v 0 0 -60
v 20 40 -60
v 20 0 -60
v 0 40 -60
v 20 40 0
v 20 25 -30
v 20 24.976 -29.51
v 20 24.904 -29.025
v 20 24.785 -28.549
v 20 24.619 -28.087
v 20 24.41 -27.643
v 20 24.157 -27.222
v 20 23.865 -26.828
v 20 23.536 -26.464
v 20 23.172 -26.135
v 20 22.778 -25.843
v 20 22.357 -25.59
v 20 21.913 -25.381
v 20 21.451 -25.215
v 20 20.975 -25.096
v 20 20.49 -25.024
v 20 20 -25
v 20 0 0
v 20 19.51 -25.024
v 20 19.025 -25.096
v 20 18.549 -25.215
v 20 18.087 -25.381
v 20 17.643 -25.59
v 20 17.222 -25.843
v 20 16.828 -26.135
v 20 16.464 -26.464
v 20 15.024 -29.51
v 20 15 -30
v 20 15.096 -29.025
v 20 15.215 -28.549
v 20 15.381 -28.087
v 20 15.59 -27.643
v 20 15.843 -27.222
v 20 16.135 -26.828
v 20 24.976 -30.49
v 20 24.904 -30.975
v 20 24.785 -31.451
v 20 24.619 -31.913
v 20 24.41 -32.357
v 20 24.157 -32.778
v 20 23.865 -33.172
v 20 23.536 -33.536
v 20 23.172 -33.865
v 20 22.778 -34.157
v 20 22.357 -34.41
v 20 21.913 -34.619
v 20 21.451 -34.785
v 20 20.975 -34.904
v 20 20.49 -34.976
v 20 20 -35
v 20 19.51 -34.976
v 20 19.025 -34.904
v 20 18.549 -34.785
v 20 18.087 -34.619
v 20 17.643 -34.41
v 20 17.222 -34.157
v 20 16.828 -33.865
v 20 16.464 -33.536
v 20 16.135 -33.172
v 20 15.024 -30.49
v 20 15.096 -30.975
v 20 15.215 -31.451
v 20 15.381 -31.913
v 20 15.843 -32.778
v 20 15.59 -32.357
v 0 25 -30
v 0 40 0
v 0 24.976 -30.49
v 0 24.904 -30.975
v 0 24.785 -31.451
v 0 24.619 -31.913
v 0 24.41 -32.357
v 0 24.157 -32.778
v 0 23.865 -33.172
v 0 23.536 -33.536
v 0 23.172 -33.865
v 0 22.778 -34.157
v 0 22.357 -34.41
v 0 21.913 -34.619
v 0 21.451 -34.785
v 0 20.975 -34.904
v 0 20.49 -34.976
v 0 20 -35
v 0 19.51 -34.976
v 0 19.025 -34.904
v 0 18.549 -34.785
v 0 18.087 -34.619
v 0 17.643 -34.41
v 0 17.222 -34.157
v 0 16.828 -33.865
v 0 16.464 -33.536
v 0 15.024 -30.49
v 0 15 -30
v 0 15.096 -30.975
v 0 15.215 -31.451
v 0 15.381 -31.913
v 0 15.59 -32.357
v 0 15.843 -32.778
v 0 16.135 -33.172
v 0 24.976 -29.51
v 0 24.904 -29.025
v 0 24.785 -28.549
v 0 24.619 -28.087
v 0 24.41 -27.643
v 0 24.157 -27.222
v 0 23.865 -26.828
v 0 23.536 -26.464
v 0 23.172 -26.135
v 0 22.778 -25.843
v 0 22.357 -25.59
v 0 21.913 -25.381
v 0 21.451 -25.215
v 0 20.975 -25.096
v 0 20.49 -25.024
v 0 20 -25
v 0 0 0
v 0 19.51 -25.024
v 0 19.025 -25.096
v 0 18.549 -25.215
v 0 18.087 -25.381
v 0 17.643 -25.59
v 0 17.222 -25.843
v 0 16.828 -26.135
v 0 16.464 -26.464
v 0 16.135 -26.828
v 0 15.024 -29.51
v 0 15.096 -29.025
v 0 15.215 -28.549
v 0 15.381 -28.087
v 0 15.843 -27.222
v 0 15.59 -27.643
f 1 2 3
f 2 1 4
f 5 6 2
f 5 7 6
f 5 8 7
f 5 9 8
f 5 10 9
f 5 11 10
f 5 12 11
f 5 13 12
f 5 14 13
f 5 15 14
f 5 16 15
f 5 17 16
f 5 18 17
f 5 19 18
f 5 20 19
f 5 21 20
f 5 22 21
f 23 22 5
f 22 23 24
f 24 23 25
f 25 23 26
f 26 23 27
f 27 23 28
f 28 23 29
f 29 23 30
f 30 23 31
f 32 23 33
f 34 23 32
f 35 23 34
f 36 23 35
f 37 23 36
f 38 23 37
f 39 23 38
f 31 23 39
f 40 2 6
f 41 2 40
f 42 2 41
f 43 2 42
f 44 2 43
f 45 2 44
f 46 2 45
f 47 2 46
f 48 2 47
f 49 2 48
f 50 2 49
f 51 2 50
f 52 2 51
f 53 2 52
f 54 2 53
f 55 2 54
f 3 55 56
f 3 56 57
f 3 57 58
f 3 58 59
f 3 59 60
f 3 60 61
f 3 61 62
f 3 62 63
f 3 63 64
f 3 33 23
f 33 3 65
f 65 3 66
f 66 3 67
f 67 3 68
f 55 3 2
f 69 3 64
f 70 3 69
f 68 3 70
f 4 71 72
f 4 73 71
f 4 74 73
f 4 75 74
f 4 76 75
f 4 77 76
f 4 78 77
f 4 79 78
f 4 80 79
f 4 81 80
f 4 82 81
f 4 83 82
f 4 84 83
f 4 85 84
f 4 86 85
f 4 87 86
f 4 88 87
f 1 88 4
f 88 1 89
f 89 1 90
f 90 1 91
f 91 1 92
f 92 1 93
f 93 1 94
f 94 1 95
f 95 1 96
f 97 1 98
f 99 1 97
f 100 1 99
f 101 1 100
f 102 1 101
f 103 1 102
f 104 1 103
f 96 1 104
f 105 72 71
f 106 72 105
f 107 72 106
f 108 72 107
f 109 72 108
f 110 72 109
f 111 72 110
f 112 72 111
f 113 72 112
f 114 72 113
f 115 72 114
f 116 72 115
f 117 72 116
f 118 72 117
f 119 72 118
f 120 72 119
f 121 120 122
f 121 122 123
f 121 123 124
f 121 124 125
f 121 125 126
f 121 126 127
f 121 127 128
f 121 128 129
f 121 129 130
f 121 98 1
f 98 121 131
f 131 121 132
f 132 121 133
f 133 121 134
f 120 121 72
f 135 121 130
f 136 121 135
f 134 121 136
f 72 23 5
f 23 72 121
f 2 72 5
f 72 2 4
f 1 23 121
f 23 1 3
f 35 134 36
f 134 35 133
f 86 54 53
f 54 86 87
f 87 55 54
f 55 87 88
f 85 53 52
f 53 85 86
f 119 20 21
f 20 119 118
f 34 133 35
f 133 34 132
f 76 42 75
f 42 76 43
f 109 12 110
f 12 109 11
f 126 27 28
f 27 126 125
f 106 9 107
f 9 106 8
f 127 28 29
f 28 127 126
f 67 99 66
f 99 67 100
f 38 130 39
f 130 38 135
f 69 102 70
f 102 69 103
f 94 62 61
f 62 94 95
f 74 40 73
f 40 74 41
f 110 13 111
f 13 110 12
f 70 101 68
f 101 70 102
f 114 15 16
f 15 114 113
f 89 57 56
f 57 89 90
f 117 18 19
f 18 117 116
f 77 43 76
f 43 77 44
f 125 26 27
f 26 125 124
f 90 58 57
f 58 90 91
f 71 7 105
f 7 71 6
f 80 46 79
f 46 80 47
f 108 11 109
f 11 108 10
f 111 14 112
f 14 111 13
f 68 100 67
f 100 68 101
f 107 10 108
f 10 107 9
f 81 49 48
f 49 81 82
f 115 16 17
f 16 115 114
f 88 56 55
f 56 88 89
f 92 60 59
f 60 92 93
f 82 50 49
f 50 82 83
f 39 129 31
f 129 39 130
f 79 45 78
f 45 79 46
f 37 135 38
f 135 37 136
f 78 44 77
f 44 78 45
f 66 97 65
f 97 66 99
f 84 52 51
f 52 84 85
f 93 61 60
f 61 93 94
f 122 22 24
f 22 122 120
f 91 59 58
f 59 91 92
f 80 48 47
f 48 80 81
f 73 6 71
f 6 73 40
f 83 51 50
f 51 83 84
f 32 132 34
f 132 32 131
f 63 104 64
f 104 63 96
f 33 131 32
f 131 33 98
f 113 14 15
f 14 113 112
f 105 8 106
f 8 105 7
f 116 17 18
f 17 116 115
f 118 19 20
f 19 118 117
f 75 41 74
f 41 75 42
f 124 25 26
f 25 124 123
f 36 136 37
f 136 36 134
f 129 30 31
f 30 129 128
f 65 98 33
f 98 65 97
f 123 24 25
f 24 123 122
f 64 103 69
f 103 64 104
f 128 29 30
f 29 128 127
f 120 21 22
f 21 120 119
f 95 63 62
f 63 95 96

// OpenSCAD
// The cable clip before its follow-up: a 10 mm hole, standing on its 40 x 20 face.
rotate([0, 90, 0]) difference() {
  cube([60, 40, 20]);
  translate([30, 20, -1]) cylinder(d = 10, h = 22, $fn = 64);
}
